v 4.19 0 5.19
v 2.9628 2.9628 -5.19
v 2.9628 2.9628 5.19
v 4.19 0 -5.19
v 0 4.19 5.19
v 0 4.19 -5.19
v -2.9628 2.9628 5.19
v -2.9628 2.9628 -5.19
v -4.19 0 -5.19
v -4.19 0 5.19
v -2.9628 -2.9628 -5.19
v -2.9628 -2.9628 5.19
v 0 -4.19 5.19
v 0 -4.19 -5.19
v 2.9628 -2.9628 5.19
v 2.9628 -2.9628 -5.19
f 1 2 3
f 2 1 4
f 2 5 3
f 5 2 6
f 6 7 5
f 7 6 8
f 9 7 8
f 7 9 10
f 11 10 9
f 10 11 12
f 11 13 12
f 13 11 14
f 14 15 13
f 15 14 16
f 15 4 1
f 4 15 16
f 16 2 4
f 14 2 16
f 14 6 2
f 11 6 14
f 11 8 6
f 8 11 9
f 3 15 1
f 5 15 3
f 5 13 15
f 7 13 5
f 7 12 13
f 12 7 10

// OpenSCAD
// spinning top
//rotate_extrude(convexity = 10) {
//  rotate([0, 90, 0])
//  import(file="spinning_top.svg", center=true);
//}

//circle(20);

$fn = 150;

module outer_body() {
  difference() {
  scale(0.37)
    rotate_extrude(convexity = 100)
      translate([27,24,0])
        import(file="spinning_top.svg", center=true);
  
     core(offset=0.2); 
      magnets();
      }
}

module core(offset=0) {
  translate([0, 0, -5-offset]) {
    cylinder(r=4+offset, $fn=8, h=10+offset*2);
  }
}

module top_part() {
  intersection() {
    outer_body();
    translate([0, 0, 0.0])
    cylinder(r=50, h=40);
  }
}

module bottom_part() {
  difference() {
  outer_body();
    cylinder(r=50, h=40);
  }
}

module magnet() {
    translate([10, 0, -0.9])
cylinder(h=2.1, r=3.1, center=true);

}

module magnets() {
    magnet();

rotate([0, 0, 120])
magnet();

rotate([0, 0, -120])
magnet();
}


//top_part();

core(offset=0.19);

//translate([0, 0, -20])
//  bottom_part();



    

//rotate_extrude(convexity = 10)
//    translate([2, 0, 0])
//        circle(r = 1, $fn = 100);
